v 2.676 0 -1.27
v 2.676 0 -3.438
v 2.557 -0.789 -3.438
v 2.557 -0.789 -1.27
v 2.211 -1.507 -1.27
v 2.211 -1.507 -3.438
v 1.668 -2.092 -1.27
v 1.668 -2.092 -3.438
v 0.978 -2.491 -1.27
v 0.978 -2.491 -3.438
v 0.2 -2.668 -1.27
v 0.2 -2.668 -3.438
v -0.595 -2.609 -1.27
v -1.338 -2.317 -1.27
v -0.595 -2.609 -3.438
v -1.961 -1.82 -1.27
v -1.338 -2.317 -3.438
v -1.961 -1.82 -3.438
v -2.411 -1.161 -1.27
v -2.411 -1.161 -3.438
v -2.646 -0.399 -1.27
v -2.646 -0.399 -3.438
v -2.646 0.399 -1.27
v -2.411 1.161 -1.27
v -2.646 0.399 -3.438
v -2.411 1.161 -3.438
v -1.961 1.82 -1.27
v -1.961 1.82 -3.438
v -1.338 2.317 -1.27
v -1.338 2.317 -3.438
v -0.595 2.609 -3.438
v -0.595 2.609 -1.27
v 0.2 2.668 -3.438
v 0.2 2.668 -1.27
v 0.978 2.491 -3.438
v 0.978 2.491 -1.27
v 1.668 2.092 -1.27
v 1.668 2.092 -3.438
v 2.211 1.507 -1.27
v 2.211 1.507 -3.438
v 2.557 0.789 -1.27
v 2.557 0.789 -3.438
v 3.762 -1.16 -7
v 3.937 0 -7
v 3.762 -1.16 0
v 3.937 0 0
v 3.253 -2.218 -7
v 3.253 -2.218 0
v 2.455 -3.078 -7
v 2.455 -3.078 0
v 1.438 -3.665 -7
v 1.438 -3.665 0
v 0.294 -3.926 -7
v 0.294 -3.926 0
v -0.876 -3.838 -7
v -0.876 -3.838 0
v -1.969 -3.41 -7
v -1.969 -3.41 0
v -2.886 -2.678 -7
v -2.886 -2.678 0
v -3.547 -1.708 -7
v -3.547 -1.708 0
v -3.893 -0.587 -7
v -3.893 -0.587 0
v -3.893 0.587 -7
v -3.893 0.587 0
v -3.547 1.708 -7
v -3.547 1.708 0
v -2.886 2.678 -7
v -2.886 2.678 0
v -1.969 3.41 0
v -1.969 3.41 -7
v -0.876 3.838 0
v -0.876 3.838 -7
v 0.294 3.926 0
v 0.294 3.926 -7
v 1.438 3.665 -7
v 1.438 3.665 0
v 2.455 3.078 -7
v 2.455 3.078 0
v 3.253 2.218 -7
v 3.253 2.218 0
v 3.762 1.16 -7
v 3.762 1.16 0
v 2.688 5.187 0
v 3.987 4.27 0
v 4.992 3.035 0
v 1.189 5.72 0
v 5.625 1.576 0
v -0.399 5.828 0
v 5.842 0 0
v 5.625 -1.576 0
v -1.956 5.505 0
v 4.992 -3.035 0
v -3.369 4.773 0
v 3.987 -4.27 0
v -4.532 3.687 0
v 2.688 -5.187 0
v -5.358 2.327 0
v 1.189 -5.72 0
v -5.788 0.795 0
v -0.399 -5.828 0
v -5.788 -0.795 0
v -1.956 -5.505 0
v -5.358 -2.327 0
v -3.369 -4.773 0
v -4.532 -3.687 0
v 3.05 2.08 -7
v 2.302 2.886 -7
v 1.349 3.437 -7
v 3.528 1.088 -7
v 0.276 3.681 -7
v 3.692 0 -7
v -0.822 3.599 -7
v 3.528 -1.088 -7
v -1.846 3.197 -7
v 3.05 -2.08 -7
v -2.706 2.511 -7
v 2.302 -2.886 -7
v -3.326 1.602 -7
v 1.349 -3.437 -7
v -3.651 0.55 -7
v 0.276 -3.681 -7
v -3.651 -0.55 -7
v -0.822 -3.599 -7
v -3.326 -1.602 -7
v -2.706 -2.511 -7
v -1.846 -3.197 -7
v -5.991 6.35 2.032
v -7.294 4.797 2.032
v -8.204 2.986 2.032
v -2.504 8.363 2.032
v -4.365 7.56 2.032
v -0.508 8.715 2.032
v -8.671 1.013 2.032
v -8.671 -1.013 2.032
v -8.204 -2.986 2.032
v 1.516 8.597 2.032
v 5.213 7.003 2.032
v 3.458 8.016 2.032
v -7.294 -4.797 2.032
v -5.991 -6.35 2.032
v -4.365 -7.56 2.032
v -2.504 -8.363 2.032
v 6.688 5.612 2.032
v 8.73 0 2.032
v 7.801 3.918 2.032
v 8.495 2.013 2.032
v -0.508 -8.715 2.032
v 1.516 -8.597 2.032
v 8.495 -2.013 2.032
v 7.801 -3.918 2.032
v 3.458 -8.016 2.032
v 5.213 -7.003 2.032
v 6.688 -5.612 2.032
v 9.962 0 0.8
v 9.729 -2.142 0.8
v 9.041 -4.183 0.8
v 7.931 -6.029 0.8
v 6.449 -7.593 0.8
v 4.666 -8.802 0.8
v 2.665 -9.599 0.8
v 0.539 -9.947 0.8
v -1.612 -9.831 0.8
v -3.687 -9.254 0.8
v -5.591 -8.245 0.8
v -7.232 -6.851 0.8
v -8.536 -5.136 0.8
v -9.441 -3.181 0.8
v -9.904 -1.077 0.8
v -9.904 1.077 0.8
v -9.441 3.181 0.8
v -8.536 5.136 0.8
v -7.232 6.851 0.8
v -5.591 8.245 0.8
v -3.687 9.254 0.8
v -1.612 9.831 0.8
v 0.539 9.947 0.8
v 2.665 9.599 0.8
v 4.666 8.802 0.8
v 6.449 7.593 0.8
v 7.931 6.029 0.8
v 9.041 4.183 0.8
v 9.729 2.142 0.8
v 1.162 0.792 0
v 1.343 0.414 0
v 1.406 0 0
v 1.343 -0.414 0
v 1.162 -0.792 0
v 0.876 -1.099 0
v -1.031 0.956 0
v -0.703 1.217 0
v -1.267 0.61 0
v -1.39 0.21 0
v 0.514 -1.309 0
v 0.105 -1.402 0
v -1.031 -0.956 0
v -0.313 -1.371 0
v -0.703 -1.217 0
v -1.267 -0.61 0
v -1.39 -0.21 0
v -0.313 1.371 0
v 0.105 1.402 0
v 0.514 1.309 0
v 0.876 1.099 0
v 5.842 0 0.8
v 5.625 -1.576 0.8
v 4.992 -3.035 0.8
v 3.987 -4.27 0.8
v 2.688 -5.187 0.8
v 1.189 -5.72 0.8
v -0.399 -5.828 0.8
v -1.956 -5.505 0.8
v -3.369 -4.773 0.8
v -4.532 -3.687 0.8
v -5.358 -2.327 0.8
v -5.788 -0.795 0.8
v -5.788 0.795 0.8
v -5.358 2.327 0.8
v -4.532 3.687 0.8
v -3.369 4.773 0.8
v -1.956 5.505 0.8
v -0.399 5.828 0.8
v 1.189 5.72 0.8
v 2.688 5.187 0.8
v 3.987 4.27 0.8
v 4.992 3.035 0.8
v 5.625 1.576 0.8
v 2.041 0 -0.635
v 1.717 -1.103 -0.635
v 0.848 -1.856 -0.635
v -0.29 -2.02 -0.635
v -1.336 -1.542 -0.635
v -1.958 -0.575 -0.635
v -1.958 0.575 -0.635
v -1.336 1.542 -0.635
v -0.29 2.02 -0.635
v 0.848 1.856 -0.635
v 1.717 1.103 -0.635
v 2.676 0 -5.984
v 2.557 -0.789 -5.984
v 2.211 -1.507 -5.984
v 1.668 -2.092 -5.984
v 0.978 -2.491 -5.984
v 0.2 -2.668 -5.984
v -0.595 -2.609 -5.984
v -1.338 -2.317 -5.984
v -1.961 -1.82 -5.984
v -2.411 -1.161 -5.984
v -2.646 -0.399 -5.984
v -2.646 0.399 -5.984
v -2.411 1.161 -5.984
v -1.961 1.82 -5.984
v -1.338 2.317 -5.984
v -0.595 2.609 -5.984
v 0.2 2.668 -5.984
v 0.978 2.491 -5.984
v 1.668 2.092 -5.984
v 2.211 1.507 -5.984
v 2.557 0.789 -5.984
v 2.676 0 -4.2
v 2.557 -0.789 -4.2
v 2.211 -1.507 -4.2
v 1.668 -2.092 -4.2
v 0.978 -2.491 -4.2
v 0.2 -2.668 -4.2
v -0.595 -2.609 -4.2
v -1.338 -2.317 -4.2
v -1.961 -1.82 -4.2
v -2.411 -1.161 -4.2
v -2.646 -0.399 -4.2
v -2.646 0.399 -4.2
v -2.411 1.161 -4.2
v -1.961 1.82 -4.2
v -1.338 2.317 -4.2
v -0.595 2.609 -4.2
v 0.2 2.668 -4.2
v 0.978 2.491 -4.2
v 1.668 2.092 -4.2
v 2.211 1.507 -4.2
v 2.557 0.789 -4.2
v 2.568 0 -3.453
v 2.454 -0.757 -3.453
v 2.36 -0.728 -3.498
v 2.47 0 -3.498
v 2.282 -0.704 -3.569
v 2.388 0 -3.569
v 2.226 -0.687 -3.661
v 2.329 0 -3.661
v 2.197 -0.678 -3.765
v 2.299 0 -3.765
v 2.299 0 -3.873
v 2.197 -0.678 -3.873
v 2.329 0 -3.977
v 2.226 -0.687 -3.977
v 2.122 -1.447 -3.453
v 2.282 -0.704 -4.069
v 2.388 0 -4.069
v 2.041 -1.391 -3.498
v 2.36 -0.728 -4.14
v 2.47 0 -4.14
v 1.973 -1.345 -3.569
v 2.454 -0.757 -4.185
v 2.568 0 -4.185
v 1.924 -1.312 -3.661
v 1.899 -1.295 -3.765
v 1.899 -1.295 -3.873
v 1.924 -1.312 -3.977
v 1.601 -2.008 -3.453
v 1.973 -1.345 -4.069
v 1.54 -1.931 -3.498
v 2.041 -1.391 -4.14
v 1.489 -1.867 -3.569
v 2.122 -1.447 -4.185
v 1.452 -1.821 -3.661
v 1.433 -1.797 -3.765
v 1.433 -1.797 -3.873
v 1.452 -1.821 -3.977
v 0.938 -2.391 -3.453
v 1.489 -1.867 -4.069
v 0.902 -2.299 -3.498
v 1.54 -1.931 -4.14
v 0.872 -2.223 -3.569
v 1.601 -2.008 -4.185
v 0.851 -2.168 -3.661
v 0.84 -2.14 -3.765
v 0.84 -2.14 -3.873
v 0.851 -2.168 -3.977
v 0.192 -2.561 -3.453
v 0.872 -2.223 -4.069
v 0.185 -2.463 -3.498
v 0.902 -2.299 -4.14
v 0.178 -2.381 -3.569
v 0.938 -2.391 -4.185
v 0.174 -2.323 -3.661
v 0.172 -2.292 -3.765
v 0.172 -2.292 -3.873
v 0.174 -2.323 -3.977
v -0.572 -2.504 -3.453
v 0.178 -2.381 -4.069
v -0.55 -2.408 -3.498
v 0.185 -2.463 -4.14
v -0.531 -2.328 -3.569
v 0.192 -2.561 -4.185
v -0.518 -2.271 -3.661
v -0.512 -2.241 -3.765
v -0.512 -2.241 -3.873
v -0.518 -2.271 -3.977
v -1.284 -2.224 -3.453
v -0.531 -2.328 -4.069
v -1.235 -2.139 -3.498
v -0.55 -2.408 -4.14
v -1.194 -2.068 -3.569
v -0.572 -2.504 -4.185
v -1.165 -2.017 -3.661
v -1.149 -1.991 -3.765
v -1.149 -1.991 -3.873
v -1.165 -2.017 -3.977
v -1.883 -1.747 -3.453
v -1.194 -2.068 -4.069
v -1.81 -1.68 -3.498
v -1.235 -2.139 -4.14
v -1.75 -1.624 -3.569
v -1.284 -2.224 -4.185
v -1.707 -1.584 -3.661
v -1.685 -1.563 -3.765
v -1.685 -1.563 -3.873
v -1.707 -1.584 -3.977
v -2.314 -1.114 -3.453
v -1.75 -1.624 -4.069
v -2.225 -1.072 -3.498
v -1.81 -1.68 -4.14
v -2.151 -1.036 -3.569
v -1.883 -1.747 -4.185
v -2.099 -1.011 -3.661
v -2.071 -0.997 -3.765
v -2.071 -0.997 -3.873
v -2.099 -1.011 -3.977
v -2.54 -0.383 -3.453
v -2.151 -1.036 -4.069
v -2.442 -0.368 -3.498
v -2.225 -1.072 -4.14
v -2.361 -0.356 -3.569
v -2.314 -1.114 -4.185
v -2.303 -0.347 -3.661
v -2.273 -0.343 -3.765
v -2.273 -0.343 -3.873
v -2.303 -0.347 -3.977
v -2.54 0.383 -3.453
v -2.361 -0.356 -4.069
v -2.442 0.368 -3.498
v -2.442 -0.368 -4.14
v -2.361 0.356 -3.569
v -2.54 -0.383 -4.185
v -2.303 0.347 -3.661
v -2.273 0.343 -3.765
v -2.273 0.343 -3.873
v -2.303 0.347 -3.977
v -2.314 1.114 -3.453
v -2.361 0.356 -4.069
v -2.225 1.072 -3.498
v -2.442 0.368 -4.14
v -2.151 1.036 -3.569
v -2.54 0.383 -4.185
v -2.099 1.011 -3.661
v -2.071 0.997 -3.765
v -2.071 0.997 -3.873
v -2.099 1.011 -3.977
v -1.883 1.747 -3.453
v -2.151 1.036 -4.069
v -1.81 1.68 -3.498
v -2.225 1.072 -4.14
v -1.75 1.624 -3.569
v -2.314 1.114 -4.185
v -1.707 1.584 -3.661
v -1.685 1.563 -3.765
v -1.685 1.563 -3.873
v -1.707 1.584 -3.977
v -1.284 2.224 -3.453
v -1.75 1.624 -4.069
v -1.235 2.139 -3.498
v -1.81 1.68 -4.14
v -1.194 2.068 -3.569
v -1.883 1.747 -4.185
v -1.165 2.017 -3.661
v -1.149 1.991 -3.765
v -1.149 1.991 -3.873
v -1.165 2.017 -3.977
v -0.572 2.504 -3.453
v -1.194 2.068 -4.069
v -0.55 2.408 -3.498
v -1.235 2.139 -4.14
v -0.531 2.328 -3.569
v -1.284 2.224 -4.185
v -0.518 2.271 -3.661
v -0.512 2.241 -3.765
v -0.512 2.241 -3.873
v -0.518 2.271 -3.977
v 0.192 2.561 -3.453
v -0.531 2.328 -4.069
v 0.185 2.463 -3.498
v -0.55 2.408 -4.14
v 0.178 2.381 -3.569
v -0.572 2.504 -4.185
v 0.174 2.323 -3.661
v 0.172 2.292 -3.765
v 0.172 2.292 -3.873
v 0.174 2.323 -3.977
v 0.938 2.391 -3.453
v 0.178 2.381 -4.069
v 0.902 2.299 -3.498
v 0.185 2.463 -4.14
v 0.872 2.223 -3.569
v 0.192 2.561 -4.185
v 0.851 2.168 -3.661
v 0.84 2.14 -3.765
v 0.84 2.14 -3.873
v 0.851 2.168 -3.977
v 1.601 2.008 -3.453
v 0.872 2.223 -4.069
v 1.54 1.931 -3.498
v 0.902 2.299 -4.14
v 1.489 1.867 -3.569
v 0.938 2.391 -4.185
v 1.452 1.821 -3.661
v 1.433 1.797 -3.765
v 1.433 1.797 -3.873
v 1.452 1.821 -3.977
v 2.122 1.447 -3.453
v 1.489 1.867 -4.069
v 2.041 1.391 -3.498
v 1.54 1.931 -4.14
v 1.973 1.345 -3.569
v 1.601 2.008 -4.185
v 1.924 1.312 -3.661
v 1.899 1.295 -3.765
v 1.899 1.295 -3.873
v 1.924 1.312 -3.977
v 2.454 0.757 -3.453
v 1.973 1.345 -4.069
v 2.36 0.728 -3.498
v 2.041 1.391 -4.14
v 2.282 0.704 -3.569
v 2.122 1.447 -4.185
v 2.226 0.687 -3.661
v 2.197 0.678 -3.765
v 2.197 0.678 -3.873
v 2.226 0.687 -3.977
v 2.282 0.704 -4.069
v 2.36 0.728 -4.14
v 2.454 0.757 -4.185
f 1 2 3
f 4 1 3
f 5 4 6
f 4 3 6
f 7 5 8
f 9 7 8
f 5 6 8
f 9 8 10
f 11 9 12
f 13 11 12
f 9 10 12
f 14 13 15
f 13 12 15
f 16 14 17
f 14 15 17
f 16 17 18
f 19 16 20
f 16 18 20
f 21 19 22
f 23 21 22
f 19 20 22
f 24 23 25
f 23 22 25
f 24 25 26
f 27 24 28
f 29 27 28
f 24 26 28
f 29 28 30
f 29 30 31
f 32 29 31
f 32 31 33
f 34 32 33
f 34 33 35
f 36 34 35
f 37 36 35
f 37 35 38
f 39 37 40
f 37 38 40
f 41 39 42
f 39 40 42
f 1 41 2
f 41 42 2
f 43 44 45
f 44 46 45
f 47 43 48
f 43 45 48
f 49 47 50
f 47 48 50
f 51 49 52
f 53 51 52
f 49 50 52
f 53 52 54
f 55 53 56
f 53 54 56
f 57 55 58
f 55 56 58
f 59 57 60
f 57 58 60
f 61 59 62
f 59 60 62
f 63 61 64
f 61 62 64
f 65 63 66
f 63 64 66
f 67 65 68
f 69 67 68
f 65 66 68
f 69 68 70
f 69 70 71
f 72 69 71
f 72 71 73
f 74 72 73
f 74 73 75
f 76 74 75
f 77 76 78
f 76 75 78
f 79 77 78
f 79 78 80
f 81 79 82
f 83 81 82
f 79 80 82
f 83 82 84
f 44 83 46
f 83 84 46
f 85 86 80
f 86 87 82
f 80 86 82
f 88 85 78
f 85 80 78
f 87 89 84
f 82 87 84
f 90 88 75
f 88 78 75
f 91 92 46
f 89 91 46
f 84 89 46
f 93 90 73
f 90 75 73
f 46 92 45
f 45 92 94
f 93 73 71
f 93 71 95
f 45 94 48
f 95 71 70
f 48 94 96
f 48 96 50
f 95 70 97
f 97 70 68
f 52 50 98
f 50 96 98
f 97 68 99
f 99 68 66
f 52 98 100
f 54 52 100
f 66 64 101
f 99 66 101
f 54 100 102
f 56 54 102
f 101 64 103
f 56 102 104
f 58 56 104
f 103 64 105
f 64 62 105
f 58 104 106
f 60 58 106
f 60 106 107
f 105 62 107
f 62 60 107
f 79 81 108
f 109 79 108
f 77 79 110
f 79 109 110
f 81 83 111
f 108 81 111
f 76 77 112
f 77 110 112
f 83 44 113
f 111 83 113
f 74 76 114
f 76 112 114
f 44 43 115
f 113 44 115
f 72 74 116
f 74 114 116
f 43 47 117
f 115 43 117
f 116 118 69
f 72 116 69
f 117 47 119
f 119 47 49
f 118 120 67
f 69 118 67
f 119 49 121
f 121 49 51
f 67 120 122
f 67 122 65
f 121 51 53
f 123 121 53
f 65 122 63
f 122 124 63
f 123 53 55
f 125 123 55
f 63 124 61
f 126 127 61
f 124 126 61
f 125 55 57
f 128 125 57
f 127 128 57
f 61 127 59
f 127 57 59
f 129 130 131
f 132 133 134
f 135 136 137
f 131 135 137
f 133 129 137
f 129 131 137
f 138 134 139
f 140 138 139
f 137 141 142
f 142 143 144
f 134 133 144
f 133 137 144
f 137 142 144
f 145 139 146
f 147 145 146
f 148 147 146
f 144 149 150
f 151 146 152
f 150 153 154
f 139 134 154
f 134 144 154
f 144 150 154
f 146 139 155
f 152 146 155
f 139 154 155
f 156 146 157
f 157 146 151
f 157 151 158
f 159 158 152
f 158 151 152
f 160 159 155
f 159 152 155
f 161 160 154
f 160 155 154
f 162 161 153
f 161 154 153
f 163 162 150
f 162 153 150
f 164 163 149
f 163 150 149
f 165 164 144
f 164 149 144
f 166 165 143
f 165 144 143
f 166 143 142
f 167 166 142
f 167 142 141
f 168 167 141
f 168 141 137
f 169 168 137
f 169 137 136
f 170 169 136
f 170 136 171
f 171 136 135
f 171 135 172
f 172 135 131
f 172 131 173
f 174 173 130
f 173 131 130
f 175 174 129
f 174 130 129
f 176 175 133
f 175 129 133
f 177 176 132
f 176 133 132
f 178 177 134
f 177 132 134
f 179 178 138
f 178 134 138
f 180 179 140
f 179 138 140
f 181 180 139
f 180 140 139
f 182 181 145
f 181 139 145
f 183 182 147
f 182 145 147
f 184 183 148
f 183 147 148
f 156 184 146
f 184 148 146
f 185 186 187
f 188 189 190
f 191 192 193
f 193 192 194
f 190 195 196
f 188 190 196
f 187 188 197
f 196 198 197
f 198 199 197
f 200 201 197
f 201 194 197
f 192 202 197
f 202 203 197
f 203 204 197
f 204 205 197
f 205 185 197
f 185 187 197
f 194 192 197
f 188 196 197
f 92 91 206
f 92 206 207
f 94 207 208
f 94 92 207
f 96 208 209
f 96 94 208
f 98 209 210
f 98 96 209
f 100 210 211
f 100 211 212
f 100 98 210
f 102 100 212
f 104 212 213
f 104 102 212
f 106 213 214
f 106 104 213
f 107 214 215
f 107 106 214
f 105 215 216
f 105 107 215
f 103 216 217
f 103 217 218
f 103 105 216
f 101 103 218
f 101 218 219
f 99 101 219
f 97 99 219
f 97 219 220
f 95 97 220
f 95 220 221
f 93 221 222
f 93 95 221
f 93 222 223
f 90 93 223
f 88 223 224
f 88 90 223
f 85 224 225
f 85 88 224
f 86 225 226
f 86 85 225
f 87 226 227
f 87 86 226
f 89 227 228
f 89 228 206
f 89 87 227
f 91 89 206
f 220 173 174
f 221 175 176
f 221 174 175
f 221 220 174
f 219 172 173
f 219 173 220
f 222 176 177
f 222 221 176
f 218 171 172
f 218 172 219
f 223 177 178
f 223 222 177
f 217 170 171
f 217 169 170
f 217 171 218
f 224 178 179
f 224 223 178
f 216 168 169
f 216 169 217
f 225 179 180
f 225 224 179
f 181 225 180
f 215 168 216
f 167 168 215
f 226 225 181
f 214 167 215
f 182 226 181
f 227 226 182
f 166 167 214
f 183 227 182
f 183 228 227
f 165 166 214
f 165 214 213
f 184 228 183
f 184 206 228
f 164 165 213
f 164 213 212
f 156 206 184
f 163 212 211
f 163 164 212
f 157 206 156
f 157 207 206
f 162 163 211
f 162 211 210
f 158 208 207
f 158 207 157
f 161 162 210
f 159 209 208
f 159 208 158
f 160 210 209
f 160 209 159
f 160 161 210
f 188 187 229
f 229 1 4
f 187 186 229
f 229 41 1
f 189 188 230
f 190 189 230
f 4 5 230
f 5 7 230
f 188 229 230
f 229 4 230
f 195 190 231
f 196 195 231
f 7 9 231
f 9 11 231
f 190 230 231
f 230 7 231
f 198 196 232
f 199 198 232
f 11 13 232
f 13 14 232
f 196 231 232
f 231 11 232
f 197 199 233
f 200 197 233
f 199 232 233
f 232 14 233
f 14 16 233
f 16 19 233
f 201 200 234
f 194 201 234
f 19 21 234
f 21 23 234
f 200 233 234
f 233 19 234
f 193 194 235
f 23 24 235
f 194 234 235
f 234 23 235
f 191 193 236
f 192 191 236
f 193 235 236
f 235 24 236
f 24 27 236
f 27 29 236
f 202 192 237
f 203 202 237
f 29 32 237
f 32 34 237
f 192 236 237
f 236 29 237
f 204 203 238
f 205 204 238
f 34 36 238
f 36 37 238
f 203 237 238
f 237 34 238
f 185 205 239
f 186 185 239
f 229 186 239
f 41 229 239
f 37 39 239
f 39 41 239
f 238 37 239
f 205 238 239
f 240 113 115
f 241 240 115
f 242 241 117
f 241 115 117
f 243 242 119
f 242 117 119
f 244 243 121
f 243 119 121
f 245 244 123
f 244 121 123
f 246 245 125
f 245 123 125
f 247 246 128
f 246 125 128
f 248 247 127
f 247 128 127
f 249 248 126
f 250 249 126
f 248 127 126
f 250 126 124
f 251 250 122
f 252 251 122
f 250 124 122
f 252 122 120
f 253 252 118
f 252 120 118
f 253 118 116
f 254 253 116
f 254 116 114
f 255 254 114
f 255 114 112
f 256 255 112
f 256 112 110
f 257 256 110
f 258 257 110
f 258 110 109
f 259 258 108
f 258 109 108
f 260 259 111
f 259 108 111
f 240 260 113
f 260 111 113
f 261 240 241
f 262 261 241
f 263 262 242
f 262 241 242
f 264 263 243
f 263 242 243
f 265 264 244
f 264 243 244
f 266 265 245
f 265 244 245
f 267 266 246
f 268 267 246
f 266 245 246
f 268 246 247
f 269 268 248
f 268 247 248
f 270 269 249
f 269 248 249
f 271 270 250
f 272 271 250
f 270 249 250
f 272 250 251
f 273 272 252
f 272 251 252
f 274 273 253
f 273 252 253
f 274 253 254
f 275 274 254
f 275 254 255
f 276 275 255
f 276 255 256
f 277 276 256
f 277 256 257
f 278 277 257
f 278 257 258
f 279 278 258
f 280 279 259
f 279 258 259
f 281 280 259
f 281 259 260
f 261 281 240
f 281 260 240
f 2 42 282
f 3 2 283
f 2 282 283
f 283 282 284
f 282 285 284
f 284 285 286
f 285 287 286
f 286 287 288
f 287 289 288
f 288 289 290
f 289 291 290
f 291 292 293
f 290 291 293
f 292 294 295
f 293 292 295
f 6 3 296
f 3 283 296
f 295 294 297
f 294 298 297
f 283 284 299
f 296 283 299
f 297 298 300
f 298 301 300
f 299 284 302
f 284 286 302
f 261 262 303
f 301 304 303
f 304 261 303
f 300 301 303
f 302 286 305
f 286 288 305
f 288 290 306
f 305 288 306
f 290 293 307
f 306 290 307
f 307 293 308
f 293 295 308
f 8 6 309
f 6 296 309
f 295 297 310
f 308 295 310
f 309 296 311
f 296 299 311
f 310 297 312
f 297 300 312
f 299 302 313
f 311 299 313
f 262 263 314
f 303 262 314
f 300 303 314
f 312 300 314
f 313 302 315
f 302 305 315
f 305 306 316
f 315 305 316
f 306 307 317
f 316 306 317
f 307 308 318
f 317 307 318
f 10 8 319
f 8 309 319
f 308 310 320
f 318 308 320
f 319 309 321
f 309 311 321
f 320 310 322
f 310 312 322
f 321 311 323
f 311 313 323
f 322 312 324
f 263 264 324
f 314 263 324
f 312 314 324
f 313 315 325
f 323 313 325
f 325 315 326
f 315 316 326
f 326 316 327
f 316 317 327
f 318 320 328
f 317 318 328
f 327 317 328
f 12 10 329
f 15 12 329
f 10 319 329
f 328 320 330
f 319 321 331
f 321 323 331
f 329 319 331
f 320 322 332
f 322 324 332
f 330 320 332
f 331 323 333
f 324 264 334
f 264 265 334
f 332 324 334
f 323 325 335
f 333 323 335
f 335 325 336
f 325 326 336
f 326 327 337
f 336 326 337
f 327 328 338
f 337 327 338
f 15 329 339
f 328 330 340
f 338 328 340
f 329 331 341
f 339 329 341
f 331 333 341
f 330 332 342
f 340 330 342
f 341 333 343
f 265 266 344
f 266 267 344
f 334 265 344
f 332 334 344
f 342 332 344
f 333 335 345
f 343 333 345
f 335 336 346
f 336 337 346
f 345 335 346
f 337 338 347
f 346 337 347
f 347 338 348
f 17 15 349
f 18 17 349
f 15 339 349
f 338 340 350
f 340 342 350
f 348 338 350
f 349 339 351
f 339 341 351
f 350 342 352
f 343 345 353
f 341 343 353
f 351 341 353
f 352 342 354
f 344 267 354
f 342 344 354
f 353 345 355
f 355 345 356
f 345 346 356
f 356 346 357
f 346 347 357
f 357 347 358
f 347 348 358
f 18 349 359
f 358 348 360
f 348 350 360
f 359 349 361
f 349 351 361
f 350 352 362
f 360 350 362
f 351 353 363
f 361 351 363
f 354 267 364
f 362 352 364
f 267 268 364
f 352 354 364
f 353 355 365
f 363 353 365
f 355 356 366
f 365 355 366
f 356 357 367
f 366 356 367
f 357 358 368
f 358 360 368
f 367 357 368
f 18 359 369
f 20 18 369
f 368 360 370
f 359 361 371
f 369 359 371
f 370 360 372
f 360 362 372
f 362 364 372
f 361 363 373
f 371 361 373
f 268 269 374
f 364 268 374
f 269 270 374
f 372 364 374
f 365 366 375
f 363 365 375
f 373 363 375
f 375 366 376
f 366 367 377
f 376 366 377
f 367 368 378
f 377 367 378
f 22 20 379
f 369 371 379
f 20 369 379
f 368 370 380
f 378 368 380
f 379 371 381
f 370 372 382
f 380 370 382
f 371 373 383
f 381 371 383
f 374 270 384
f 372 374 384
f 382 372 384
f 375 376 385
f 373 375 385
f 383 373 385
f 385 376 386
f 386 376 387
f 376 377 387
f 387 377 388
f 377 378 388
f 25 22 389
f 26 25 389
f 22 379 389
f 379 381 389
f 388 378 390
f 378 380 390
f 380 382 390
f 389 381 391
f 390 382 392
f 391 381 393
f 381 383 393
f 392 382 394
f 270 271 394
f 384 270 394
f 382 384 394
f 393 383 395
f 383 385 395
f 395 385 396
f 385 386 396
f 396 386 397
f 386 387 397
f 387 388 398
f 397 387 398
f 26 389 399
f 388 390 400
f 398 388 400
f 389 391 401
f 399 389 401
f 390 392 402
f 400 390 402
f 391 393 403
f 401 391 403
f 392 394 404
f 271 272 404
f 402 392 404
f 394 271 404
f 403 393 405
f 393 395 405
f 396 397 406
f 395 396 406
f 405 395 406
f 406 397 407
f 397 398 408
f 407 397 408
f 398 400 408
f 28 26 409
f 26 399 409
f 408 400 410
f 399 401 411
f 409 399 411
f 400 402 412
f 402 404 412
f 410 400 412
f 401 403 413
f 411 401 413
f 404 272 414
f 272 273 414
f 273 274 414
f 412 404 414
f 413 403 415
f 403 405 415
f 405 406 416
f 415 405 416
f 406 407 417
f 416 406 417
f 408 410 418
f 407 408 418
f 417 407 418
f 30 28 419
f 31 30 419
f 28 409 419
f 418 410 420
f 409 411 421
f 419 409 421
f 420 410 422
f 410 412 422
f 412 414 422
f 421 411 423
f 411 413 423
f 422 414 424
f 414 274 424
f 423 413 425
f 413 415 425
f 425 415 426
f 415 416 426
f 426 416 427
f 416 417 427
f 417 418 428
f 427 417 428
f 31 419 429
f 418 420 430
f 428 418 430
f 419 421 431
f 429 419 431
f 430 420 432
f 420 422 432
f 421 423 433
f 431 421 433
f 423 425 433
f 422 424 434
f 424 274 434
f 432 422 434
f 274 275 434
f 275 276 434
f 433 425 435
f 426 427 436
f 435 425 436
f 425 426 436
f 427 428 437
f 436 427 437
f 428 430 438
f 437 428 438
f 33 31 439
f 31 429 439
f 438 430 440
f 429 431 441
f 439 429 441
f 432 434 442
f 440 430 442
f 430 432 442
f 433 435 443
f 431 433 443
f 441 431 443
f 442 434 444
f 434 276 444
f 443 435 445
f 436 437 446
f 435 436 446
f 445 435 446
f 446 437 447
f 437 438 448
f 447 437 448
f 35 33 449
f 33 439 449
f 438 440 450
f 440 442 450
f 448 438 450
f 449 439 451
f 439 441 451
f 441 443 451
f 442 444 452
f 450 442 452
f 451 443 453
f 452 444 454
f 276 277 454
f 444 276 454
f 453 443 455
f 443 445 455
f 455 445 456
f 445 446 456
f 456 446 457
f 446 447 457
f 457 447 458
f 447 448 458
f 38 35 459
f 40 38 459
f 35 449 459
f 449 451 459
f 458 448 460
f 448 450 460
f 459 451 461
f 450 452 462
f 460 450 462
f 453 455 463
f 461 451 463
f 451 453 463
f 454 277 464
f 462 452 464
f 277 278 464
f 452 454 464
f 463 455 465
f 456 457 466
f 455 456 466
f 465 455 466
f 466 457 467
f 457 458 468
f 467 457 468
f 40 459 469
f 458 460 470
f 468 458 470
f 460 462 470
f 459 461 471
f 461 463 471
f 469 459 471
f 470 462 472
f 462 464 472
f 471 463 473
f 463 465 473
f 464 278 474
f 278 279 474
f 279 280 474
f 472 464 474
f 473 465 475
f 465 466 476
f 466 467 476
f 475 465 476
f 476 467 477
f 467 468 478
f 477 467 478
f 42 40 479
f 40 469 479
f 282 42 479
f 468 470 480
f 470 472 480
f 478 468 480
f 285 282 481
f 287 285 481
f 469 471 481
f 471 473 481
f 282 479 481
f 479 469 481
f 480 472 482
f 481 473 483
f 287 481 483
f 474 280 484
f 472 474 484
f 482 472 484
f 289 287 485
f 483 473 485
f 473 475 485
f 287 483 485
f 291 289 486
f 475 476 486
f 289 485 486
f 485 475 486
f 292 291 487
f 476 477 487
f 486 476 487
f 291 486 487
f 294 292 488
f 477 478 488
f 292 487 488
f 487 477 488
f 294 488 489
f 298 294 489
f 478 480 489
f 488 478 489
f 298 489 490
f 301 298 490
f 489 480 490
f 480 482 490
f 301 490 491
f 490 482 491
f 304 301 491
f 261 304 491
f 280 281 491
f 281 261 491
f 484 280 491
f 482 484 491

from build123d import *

# Parameters (mm, degrees)
F2_SIZE  = 1.27
F3_R     = 18.9556070846
F3_R_2   = 5.842
F4_DEPTH = 0.8
F5_SIZE  = 1.016


# Not quite as in the source:
# - a fillet or chamfer that OpenCascade refuses, or shapes differently, is made with other operations: its cross-section is extruded or revolved along the edge and cut away or added


with BuildPart() as f1:
    # F0 (on Front) → F1 (revolve)
    with BuildSketch(Plane.XZ):
        with BuildLine():
            Line((0, 0), (2.6757909362, 0))
            Line((2.6757909362, 0), (2.6757909362, -3.438))
            ThreePointArc((2.6757909362, -3.438), (2.2947909362, -3.819), (2.6757909362, -4.2))
            Line((2.6757909362, -4.2), (2.6757909362, -7))
            Line((2.6757909362, -7), (3.937, -7))
            Line((3.937, -7), (3.937, 0))
            Line((3.937, 0), (10, 0))
            Line((10, 0), (10, 2.032))
            Line((10, 2.032), (0, 2.032))
            Line((0, 2.032), (0, 0))
        make_face()
    revolve(axis=Axis((0, 0, 1.016), (0, 0, -1)))

    # F2
    f2_edges = [f1.edges().sort_by_distance(p)[0] for p in [
        (-2.675791, 0, 0),
    ]]
    chamfer(f2_edges, length=F2_SIZE)

    # F3 (on face) → F4 (cut)
    with BuildSketch(Plane(origin=(0, 0, 0), x_dir=(1, 0, 0), z_dir=(0, 0, -1))):
        with Locations((0, -0.8832210264)):
            Circle(F3_R)
        Circle(F3_R_2, mode=Mode.SUBTRACT)
    extrude(amount=-F4_DEPTH, mode=Mode.SUBTRACT)

    # F5
    f5_edges = [f1.edges().sort_by_distance(p)[0] for p in [
        (-2.675791, 0, -7),
    ]]
    chamfer(f5_edges, length=F5_SIZE)

    # F6: chamfer of 1.27 on 1 edges, made by hand

    # F6_s1 → F6_t2 (revolve, cut)
    with BuildSketch(Plane.XZ):
        Polygon((10, 0.762), (8.73, 2.032), (10, 2.032), align=None)
    revolve(axis=Axis((0, 0, 2.032), (0, 0, -1)), mode=Mode.SUBTRACT)


solid = f1.part
